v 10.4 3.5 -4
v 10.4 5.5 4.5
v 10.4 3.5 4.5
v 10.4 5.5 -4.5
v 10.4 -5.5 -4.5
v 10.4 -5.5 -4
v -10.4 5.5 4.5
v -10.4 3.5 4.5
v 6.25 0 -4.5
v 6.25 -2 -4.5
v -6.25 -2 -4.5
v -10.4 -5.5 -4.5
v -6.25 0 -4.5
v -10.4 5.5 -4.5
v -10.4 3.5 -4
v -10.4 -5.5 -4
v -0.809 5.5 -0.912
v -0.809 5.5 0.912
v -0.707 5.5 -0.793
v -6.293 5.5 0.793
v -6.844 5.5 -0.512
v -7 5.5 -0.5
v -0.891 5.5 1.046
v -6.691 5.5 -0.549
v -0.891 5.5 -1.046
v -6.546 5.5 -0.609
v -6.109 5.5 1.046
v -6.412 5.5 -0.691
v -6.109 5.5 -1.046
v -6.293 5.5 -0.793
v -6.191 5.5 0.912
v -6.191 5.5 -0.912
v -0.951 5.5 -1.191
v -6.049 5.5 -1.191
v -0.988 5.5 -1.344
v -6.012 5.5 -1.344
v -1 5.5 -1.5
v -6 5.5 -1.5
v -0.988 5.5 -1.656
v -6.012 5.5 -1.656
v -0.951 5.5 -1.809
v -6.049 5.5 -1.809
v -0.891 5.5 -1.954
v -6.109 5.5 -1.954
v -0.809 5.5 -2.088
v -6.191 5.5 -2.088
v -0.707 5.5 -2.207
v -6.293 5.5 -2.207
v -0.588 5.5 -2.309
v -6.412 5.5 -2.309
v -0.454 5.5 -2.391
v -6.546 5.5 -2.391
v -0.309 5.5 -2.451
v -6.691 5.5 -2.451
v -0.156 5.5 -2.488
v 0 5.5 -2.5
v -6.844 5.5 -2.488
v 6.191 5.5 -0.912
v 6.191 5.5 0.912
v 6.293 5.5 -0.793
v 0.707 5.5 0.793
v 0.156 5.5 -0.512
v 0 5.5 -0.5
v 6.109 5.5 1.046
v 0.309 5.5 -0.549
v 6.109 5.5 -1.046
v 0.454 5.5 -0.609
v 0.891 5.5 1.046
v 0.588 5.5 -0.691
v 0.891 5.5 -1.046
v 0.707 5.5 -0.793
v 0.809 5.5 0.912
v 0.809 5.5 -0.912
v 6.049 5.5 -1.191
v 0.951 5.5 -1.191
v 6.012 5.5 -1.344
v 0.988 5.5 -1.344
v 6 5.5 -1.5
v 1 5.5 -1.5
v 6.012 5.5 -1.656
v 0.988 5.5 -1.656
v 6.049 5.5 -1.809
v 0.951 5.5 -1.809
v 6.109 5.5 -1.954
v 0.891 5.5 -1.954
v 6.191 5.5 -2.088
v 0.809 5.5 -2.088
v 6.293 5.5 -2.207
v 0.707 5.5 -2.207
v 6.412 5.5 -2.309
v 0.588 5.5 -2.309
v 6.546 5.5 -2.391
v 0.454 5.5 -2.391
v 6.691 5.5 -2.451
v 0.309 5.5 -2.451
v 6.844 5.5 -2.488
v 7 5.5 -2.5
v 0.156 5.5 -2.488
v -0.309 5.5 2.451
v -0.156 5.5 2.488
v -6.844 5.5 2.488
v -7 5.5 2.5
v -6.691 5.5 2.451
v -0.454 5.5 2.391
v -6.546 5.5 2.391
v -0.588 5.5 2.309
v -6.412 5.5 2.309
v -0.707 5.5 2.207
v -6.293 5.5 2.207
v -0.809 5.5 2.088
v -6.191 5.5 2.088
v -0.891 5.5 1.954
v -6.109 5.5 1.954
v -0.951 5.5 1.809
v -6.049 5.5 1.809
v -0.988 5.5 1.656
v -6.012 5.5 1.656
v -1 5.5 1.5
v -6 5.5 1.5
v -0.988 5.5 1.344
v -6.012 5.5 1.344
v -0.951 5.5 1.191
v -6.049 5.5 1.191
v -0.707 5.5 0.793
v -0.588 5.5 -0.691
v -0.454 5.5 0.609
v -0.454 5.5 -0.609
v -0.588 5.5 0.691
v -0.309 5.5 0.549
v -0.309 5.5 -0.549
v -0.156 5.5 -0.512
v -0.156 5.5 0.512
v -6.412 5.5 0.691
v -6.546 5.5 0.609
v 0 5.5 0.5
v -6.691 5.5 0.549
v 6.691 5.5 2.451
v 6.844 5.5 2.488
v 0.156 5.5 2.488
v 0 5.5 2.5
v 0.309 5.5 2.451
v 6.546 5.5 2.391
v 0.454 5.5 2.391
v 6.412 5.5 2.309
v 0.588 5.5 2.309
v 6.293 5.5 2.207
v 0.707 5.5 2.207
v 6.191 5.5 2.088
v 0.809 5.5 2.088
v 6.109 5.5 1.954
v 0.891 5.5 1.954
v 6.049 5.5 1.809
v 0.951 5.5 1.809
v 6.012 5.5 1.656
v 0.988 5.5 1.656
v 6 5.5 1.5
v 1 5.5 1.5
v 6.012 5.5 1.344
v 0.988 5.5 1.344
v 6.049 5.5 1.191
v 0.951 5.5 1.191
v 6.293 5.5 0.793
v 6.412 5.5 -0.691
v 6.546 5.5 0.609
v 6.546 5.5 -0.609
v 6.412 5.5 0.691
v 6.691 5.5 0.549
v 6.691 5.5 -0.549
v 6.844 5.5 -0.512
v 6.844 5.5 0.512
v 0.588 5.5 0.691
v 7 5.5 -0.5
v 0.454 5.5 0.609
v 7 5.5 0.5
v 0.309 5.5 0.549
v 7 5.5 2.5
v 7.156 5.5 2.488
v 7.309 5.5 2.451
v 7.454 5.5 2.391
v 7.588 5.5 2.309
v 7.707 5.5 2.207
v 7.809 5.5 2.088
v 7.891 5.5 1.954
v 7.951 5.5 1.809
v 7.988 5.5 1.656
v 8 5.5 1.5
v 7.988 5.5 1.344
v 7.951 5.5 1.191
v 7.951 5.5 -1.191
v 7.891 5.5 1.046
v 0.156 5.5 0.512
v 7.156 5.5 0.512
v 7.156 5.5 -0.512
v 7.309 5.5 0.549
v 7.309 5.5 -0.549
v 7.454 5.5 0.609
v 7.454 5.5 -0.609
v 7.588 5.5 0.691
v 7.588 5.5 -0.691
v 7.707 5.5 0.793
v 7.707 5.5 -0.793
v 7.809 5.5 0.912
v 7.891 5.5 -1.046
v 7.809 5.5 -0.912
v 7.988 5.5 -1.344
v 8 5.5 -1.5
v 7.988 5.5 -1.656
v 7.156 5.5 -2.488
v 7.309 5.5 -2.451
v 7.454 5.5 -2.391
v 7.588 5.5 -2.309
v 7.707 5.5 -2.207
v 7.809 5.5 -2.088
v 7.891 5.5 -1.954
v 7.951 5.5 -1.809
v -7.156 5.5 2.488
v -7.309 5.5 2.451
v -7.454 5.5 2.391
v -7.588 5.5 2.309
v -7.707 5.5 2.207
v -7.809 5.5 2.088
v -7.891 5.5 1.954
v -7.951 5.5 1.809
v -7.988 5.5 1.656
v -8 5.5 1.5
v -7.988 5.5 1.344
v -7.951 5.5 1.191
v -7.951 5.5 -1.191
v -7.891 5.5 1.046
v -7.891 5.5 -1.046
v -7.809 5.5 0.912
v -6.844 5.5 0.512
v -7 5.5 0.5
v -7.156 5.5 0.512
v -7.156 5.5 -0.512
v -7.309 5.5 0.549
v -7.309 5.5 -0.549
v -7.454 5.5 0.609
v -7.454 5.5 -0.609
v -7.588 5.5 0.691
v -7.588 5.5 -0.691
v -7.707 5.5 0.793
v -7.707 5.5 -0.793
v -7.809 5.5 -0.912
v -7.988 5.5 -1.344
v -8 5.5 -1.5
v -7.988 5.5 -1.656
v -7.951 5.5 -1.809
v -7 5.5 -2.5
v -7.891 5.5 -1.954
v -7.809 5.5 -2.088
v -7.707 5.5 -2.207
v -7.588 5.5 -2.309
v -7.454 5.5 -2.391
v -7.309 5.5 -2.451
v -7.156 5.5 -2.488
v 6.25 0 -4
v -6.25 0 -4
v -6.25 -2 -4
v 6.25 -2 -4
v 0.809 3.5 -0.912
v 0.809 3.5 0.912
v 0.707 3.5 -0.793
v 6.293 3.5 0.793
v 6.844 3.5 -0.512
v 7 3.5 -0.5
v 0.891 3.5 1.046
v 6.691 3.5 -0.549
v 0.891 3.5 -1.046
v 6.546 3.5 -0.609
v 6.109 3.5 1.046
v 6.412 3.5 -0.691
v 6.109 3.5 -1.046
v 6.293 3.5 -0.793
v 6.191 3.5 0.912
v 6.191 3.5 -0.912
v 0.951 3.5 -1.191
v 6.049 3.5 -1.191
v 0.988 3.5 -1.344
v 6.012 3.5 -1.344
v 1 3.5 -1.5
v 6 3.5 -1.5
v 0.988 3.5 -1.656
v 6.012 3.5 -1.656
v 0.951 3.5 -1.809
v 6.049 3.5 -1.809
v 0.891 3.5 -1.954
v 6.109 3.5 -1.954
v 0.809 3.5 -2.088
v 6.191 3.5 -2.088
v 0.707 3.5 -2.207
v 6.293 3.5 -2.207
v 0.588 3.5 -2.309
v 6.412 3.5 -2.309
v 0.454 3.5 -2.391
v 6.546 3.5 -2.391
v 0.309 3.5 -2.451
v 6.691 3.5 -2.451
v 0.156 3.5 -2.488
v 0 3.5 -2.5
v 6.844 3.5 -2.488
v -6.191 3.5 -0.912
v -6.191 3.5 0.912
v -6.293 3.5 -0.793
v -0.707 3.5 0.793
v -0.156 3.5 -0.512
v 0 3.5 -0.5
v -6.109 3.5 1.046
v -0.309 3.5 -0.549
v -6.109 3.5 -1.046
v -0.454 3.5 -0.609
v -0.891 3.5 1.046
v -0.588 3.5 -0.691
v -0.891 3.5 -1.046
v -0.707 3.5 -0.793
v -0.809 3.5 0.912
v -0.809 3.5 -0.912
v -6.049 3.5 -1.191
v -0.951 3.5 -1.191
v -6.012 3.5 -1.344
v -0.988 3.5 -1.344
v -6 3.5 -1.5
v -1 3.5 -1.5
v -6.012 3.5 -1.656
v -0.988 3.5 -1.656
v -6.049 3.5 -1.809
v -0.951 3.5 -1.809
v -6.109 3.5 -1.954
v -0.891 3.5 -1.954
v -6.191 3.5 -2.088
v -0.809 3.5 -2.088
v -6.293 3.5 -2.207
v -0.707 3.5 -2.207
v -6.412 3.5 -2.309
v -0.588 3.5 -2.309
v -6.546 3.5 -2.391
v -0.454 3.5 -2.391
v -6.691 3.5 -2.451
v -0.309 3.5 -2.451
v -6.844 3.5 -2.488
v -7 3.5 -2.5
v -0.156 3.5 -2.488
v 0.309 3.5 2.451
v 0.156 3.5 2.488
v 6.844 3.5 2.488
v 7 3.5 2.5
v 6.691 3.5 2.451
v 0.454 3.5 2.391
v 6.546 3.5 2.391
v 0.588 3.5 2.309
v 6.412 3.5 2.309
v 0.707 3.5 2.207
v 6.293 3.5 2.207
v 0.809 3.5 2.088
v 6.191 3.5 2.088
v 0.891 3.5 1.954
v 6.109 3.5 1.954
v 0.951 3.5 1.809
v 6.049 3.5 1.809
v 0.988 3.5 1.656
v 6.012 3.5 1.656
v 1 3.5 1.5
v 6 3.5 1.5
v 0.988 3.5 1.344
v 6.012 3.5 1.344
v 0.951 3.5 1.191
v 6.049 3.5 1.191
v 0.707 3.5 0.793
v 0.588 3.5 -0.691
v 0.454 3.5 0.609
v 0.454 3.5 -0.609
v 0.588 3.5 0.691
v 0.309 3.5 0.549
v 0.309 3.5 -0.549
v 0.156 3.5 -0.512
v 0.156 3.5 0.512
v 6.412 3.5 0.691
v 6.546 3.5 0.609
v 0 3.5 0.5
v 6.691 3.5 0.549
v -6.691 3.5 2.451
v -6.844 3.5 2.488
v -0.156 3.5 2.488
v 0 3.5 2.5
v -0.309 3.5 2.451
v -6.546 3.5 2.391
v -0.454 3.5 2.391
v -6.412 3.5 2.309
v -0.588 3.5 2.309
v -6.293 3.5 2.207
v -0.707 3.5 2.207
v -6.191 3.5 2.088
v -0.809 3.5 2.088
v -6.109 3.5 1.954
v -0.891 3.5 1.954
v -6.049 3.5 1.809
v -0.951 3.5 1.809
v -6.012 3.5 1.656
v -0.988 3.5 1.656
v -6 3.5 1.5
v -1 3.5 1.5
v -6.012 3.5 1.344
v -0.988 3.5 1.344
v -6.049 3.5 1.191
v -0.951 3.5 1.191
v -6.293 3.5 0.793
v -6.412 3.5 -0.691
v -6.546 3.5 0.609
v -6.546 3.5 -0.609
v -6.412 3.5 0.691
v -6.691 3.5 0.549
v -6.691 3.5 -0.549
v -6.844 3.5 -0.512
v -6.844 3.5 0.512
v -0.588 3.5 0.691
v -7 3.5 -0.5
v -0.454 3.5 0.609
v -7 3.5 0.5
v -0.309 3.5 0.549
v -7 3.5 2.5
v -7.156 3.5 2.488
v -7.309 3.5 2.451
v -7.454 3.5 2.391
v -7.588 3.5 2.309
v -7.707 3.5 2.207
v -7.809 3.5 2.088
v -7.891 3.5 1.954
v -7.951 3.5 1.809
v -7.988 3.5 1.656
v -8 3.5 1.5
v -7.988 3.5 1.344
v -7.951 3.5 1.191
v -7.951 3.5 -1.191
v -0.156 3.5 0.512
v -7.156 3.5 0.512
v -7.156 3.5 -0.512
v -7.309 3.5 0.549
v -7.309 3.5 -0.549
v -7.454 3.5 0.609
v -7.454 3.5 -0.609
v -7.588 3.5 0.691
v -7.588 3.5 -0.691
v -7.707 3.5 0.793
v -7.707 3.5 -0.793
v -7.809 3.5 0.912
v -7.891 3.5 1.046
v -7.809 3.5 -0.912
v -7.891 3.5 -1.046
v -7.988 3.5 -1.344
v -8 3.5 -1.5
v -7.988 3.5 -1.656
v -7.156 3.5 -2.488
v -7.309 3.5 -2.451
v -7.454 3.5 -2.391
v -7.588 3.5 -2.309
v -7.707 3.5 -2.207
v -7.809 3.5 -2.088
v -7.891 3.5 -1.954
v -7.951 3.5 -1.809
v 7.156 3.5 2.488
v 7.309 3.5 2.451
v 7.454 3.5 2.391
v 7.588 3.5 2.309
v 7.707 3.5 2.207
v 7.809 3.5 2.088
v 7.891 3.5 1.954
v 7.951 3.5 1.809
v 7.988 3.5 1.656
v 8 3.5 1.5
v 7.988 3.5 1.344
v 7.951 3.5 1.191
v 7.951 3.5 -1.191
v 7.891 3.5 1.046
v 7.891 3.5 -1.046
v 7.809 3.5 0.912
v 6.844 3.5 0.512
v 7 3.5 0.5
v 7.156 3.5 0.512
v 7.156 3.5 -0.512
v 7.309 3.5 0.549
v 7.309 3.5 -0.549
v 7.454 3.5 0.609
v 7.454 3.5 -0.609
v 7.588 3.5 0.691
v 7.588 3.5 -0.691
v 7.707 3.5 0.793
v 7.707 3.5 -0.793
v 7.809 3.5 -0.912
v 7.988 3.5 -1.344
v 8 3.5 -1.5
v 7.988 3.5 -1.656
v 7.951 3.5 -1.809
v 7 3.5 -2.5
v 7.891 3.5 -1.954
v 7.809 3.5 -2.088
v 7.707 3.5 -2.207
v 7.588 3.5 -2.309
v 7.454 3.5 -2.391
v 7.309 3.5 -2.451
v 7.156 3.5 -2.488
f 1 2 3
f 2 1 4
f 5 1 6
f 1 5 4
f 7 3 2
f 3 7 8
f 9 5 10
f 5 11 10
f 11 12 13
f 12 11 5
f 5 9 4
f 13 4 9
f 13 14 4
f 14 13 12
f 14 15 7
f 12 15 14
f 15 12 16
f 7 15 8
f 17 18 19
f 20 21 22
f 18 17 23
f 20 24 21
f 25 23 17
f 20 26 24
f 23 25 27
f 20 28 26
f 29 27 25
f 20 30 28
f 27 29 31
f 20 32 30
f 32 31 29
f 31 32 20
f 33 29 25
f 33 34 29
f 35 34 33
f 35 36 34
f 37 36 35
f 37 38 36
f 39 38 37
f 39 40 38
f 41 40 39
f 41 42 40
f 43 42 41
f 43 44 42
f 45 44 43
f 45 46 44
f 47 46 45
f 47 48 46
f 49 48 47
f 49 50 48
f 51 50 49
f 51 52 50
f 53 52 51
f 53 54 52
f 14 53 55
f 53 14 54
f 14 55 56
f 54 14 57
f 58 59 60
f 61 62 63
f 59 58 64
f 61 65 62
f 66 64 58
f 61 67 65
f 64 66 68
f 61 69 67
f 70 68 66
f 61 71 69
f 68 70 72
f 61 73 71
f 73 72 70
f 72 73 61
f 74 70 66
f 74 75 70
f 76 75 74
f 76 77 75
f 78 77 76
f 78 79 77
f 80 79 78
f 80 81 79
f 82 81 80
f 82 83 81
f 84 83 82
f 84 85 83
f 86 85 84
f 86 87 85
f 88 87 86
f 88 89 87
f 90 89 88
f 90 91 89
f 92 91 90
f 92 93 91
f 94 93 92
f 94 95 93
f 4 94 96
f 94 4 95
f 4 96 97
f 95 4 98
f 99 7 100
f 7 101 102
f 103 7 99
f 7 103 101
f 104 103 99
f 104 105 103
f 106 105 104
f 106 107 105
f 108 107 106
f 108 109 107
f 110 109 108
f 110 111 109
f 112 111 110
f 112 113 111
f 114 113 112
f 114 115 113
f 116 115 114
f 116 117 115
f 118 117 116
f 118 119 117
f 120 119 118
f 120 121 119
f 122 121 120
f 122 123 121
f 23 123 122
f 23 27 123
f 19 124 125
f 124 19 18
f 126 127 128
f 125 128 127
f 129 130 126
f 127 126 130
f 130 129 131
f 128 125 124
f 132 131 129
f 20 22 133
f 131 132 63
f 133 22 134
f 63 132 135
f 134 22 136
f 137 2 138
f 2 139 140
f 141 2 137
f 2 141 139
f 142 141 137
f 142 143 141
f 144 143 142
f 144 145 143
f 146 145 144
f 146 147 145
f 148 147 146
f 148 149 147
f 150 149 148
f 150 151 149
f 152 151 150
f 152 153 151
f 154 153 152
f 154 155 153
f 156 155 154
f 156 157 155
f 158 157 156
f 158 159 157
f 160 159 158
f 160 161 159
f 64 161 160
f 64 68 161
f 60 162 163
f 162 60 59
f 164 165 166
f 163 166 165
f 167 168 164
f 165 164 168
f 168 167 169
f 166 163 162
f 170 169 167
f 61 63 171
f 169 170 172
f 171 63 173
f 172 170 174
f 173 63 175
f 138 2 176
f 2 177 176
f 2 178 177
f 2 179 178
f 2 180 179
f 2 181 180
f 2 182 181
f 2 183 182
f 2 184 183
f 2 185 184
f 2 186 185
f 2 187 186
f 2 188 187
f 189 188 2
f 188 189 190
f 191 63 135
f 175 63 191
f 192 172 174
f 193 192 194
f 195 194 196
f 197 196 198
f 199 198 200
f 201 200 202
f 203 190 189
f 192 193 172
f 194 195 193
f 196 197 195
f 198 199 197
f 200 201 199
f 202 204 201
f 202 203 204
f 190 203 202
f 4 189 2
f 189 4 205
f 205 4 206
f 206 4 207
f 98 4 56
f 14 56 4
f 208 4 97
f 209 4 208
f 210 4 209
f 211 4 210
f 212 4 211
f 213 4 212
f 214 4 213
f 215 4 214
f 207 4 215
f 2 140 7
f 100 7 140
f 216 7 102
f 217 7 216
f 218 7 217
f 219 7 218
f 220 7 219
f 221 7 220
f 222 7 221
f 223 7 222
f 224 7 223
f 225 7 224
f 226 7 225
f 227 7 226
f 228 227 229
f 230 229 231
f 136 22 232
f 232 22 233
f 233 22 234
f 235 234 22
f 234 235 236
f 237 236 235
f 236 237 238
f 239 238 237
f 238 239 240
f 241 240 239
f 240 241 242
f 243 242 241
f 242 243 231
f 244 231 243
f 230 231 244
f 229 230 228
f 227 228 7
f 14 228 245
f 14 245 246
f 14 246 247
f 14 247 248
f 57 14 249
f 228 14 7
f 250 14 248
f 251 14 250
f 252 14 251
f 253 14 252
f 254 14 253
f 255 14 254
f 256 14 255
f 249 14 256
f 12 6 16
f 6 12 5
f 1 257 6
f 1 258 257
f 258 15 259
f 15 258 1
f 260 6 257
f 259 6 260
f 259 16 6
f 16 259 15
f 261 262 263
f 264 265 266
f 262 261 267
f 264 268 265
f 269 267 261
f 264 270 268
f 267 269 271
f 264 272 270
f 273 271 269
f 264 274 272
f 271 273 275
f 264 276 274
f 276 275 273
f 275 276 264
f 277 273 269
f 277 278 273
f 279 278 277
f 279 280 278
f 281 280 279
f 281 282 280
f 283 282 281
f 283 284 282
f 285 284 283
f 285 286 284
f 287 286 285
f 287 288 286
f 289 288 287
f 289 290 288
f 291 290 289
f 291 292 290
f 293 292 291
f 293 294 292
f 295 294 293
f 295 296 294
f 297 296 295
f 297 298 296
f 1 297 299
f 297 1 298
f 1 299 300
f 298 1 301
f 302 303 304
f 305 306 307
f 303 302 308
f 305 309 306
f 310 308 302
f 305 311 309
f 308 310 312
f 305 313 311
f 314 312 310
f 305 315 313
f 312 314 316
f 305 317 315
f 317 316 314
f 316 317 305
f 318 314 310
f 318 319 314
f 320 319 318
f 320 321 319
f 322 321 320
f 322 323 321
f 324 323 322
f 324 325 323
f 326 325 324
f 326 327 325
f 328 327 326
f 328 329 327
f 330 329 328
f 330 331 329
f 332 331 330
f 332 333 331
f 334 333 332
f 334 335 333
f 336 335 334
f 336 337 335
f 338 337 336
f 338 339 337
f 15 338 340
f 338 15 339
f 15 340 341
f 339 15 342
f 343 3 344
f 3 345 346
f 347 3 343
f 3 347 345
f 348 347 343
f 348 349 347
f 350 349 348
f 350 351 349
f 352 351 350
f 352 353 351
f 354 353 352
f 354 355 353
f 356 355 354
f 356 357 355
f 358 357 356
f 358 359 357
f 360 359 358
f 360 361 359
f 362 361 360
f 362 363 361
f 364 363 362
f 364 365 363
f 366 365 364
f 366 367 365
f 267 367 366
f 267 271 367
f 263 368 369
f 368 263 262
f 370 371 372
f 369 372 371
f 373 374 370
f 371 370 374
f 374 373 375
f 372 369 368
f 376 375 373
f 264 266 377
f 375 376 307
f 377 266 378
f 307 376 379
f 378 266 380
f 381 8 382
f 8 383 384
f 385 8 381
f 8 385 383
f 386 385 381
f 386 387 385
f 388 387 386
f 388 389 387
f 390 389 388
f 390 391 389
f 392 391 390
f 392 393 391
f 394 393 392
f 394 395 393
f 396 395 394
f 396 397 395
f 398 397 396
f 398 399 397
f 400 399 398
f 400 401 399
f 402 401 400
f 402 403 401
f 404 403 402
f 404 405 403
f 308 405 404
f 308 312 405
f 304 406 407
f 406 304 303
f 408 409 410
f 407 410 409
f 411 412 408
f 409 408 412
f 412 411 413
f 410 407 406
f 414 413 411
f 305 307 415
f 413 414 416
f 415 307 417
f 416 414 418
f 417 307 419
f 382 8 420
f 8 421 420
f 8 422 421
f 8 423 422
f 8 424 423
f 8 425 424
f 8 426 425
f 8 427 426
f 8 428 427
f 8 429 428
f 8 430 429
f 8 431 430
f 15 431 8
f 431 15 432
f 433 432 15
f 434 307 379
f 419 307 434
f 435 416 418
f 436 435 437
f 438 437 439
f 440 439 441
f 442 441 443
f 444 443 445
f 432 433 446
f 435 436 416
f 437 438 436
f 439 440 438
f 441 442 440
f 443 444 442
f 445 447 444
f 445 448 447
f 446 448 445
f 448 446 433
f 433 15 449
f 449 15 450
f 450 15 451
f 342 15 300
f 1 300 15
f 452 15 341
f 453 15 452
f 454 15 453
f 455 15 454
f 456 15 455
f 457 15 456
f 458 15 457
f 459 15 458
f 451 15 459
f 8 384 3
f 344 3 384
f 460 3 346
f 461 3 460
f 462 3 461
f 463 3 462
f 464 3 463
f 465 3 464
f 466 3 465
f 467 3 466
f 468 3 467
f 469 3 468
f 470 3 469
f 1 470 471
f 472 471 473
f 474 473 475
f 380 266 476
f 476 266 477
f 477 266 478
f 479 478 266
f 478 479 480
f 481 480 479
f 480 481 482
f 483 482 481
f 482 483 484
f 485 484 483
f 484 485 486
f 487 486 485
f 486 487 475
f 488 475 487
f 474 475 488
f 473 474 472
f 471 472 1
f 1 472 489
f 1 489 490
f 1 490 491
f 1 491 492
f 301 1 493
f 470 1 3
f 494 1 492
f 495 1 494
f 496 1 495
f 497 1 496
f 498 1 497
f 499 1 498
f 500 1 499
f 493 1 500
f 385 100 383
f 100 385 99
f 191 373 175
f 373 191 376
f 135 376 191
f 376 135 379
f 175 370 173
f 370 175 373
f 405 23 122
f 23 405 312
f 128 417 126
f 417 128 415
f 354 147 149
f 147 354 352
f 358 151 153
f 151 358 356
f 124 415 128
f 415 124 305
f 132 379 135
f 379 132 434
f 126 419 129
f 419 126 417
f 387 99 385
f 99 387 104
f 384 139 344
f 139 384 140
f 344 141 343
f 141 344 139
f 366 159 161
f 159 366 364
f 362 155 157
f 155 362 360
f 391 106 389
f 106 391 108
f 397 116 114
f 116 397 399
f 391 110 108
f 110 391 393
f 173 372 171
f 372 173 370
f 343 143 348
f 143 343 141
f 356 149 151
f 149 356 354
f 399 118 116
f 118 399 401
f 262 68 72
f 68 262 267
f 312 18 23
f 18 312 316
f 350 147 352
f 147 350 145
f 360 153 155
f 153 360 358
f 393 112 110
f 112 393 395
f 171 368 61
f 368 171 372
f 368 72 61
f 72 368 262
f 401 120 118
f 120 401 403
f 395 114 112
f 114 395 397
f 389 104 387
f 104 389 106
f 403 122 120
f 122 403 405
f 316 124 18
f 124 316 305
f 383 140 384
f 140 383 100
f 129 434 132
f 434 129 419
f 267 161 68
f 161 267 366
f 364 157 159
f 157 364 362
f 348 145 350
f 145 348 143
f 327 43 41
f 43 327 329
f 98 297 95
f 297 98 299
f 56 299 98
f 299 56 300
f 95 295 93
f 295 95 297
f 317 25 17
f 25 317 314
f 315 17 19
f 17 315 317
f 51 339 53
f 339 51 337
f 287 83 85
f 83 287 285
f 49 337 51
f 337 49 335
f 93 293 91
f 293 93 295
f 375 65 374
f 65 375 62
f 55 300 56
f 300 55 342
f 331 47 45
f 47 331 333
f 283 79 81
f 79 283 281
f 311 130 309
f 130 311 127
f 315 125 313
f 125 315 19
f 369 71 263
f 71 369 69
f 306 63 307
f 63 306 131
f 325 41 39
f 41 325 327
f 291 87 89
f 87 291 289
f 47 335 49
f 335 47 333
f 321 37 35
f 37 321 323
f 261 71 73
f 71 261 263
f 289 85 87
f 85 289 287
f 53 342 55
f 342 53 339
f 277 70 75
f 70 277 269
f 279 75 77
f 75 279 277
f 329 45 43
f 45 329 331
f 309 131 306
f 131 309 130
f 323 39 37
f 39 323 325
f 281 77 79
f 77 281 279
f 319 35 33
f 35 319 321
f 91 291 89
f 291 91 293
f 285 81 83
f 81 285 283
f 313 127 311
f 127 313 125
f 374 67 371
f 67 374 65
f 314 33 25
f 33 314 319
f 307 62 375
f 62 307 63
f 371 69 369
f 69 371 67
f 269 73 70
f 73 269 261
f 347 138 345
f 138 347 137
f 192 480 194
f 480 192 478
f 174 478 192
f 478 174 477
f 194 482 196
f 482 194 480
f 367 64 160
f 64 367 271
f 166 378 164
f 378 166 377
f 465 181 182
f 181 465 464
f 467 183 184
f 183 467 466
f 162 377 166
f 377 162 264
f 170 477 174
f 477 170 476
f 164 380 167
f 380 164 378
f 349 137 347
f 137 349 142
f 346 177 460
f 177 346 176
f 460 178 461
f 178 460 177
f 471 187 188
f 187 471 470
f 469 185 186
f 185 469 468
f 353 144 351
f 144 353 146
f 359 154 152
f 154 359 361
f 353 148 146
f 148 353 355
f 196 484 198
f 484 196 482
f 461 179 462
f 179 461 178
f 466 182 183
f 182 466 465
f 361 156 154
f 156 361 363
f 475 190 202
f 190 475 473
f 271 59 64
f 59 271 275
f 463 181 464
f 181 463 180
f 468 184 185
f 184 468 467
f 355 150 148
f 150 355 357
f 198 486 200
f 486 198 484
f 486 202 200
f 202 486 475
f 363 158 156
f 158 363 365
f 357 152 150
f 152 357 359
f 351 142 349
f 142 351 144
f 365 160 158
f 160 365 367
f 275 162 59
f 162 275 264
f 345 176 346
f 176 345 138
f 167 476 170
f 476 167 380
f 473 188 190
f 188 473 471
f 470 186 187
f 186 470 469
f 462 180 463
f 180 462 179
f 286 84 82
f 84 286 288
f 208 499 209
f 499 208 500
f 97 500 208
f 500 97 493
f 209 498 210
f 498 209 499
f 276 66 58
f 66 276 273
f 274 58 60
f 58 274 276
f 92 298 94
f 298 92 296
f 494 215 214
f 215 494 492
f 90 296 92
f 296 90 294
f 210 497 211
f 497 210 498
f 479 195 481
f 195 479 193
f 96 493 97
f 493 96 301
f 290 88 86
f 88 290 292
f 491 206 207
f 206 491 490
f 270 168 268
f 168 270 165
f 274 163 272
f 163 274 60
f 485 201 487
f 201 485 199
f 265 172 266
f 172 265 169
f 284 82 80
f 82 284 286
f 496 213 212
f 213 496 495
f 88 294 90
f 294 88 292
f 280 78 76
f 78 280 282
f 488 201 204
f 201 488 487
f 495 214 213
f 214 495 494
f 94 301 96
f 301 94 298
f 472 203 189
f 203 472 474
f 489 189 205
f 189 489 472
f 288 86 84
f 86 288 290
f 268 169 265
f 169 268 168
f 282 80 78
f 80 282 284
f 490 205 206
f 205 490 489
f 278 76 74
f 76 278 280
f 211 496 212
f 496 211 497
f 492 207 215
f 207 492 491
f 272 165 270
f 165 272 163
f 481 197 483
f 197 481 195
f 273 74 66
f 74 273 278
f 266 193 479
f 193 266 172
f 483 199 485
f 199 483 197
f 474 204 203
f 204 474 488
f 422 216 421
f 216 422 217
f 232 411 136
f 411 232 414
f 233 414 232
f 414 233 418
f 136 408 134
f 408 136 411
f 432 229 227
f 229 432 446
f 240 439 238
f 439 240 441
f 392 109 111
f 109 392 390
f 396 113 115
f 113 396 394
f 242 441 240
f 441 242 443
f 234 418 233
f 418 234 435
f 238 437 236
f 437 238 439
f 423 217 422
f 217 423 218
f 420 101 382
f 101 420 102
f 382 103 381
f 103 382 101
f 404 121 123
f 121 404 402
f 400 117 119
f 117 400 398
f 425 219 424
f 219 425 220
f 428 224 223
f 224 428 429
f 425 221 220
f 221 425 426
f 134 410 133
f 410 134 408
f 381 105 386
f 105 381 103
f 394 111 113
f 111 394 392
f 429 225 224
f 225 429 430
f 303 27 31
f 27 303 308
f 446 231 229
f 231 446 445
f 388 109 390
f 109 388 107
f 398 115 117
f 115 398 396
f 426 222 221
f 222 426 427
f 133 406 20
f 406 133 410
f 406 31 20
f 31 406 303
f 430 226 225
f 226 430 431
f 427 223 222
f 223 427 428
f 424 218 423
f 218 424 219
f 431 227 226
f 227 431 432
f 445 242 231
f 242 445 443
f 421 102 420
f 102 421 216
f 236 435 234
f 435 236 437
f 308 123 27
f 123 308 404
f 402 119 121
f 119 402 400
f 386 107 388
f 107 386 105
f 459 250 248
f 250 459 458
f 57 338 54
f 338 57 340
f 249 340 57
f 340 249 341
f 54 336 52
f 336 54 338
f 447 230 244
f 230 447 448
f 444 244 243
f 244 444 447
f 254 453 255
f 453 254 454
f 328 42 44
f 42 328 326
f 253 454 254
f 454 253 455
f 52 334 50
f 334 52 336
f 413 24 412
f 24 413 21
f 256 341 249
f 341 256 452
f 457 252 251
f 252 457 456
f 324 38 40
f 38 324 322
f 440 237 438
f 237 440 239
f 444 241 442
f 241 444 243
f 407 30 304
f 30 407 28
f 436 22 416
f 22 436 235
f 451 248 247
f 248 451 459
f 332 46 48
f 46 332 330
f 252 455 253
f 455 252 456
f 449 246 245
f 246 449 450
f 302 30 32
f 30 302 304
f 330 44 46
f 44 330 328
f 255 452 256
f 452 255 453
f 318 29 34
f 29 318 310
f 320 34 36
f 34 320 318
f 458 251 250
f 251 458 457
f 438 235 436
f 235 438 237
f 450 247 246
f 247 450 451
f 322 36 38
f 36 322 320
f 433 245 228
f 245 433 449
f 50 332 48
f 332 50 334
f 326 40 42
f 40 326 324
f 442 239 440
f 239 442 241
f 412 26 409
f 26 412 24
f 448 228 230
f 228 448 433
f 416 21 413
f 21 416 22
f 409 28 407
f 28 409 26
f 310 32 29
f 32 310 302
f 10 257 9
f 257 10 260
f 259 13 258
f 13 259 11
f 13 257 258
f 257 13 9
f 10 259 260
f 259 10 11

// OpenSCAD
kabelhalter();



module kabelhalter(){
difference(){
L();
    translate([0,4.75,0]){
 hohles();
    }
    translate([7,4.75,0]){
 hohles();
    }
    translate([-7,4.75,0]){
 hohles();
    }
    translate([0,-1,-4]){
cube([12.5,2,3], center = true);
}

    
}}







module L(){

difference()
{
   cube([20.8,11,9], center = true); 
    //inner cube
    translate([0,-2,1]){
cube([21.8,11,10], center = true);
    }
}
}






module spange(){
difference(){
O();
    translate([0,4.75,0]){
 hohles();
    }
    translate([7,4.75,0]){
 hohles();
    }
    translate([-7,4.75,0]){
 hohles();
    }
    
}}
module O(){

difference()
{
   cube([20.8,10,10], center = true); 
    //inner cube
    translate([0,0,0]){
cube([19.8,9,10], center = true);
    }
}
}

module hohles()
{
    
rotate([90,90,0]){

translate([-1.5,0,0])
{
    union(){
cylinder(3,d=2,center=true,$fn=40);
translate([3,0,0])
{
cylinder(3,d=2,center=true,$fn=40);
}}}}

    }
